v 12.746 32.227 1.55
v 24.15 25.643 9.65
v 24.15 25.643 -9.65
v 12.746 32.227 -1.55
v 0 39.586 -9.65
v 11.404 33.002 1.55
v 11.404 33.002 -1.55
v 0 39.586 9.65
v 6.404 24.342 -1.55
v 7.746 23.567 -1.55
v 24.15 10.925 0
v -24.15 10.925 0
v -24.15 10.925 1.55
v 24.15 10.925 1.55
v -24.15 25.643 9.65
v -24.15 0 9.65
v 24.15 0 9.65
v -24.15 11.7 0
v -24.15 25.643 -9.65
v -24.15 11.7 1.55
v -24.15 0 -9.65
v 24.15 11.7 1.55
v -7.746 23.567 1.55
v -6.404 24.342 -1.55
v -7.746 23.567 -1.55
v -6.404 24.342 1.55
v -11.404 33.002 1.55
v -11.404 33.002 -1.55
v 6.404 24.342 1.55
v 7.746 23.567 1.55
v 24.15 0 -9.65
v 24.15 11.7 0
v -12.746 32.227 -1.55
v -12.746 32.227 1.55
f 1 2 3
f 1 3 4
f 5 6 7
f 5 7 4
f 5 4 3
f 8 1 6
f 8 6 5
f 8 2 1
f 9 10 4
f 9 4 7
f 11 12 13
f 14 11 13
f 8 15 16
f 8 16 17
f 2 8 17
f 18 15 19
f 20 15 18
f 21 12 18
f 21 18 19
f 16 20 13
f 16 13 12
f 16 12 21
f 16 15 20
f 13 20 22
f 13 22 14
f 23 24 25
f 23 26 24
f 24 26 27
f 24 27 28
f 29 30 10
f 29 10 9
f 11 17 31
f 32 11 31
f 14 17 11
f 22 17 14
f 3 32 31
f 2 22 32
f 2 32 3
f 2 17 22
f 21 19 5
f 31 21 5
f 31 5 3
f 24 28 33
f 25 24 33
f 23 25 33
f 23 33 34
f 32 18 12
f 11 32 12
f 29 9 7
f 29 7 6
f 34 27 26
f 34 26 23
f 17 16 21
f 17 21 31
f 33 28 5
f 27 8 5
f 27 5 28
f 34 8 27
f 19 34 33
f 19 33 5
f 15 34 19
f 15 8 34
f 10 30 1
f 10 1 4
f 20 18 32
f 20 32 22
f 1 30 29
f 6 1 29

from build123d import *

# Parameters (mm, degrees)
F0_W     = 24.15
F0_H     = 11.7
F1_DEPTH = 9.65
F2_W     = 0.775
F2_H     = 1.55
F3_DEPTH = 48.3
F4_W     = 1.55
F4_H     = 1.55
F5_DEPTH = 10
F6_W     = 1.55
F6_H     = 1.55
F7_DEPTH = 10


with BuildPart() as f1:
    # F0 (on Top) → F1 (new body, symmetric)
    with BuildSketch(Plane.XY):
        Polygon((-24.15, 11.7), (0, 11.7), (-12.075, 32.6145135014), (-24.15, 25.6430090009), align=None)
        with Locations((-12.075, 5.85)):
            Rectangle(F0_W, F0_H)
        with Locations((12.075, 5.85)):
            Rectangle(F0_W, F0_H)
        Polygon((12.075, 32.6145135014), (0, 11.7), (24.15, 11.7), (24.15, 25.6430090009), align=None)
        Polygon((-12.075, 32.6145135014), (0, 11.7), (12.075, 32.6145135014), (0, 39.5860180019), align=None)
    extrude(amount=F1_DEPTH, both=True)

    # F2 (on face) → F3 (cut)
    with BuildSketch(Plane(origin=(-24.15, 0, 0), x_dir=(0, -1, 0), z_dir=(-1, 0, 0))):
        with Locations((-11.3125, 0.775)):
            Rectangle(F2_W, F2_H)
    extrude(amount=-F3_DEPTH, mode=Mode.SUBTRACT)

    # F4 (on face) → F5 (cut)
    with BuildSketch(Plane(origin=(17.1412486121, 29.6895135014, 0), x_dir=(-0.8660254038, 0.5, 0), z_dir=(0.5, 0.8660254038, 0))):
        with Locations((5.85, 0.775)):
            Rectangle(F4_W, F4_H)
        with Locations((5.85, -0.775)):
            Rectangle(F4_W, F4_H)
    extrude(amount=-F5_DEPTH, mode=Mode.SUBTRACT)

    # F6 (on face) → F7 (cut)
    with BuildSketch(Plane(origin=(-17.1412486121, 29.6895135014, 0), x_dir=(-0.8660254038, -0.5, 0), z_dir=(-0.5, 0.8660254038, 0))):
        with Locations((-5.85, -0.775)):
            Rectangle(F6_W, F6_H)
        with Locations((-5.85, 0.775)):
            Rectangle(F6_W, F6_H)
    extrude(amount=-F7_DEPTH, mode=Mode.SUBTRACT)


solid = f1.part
